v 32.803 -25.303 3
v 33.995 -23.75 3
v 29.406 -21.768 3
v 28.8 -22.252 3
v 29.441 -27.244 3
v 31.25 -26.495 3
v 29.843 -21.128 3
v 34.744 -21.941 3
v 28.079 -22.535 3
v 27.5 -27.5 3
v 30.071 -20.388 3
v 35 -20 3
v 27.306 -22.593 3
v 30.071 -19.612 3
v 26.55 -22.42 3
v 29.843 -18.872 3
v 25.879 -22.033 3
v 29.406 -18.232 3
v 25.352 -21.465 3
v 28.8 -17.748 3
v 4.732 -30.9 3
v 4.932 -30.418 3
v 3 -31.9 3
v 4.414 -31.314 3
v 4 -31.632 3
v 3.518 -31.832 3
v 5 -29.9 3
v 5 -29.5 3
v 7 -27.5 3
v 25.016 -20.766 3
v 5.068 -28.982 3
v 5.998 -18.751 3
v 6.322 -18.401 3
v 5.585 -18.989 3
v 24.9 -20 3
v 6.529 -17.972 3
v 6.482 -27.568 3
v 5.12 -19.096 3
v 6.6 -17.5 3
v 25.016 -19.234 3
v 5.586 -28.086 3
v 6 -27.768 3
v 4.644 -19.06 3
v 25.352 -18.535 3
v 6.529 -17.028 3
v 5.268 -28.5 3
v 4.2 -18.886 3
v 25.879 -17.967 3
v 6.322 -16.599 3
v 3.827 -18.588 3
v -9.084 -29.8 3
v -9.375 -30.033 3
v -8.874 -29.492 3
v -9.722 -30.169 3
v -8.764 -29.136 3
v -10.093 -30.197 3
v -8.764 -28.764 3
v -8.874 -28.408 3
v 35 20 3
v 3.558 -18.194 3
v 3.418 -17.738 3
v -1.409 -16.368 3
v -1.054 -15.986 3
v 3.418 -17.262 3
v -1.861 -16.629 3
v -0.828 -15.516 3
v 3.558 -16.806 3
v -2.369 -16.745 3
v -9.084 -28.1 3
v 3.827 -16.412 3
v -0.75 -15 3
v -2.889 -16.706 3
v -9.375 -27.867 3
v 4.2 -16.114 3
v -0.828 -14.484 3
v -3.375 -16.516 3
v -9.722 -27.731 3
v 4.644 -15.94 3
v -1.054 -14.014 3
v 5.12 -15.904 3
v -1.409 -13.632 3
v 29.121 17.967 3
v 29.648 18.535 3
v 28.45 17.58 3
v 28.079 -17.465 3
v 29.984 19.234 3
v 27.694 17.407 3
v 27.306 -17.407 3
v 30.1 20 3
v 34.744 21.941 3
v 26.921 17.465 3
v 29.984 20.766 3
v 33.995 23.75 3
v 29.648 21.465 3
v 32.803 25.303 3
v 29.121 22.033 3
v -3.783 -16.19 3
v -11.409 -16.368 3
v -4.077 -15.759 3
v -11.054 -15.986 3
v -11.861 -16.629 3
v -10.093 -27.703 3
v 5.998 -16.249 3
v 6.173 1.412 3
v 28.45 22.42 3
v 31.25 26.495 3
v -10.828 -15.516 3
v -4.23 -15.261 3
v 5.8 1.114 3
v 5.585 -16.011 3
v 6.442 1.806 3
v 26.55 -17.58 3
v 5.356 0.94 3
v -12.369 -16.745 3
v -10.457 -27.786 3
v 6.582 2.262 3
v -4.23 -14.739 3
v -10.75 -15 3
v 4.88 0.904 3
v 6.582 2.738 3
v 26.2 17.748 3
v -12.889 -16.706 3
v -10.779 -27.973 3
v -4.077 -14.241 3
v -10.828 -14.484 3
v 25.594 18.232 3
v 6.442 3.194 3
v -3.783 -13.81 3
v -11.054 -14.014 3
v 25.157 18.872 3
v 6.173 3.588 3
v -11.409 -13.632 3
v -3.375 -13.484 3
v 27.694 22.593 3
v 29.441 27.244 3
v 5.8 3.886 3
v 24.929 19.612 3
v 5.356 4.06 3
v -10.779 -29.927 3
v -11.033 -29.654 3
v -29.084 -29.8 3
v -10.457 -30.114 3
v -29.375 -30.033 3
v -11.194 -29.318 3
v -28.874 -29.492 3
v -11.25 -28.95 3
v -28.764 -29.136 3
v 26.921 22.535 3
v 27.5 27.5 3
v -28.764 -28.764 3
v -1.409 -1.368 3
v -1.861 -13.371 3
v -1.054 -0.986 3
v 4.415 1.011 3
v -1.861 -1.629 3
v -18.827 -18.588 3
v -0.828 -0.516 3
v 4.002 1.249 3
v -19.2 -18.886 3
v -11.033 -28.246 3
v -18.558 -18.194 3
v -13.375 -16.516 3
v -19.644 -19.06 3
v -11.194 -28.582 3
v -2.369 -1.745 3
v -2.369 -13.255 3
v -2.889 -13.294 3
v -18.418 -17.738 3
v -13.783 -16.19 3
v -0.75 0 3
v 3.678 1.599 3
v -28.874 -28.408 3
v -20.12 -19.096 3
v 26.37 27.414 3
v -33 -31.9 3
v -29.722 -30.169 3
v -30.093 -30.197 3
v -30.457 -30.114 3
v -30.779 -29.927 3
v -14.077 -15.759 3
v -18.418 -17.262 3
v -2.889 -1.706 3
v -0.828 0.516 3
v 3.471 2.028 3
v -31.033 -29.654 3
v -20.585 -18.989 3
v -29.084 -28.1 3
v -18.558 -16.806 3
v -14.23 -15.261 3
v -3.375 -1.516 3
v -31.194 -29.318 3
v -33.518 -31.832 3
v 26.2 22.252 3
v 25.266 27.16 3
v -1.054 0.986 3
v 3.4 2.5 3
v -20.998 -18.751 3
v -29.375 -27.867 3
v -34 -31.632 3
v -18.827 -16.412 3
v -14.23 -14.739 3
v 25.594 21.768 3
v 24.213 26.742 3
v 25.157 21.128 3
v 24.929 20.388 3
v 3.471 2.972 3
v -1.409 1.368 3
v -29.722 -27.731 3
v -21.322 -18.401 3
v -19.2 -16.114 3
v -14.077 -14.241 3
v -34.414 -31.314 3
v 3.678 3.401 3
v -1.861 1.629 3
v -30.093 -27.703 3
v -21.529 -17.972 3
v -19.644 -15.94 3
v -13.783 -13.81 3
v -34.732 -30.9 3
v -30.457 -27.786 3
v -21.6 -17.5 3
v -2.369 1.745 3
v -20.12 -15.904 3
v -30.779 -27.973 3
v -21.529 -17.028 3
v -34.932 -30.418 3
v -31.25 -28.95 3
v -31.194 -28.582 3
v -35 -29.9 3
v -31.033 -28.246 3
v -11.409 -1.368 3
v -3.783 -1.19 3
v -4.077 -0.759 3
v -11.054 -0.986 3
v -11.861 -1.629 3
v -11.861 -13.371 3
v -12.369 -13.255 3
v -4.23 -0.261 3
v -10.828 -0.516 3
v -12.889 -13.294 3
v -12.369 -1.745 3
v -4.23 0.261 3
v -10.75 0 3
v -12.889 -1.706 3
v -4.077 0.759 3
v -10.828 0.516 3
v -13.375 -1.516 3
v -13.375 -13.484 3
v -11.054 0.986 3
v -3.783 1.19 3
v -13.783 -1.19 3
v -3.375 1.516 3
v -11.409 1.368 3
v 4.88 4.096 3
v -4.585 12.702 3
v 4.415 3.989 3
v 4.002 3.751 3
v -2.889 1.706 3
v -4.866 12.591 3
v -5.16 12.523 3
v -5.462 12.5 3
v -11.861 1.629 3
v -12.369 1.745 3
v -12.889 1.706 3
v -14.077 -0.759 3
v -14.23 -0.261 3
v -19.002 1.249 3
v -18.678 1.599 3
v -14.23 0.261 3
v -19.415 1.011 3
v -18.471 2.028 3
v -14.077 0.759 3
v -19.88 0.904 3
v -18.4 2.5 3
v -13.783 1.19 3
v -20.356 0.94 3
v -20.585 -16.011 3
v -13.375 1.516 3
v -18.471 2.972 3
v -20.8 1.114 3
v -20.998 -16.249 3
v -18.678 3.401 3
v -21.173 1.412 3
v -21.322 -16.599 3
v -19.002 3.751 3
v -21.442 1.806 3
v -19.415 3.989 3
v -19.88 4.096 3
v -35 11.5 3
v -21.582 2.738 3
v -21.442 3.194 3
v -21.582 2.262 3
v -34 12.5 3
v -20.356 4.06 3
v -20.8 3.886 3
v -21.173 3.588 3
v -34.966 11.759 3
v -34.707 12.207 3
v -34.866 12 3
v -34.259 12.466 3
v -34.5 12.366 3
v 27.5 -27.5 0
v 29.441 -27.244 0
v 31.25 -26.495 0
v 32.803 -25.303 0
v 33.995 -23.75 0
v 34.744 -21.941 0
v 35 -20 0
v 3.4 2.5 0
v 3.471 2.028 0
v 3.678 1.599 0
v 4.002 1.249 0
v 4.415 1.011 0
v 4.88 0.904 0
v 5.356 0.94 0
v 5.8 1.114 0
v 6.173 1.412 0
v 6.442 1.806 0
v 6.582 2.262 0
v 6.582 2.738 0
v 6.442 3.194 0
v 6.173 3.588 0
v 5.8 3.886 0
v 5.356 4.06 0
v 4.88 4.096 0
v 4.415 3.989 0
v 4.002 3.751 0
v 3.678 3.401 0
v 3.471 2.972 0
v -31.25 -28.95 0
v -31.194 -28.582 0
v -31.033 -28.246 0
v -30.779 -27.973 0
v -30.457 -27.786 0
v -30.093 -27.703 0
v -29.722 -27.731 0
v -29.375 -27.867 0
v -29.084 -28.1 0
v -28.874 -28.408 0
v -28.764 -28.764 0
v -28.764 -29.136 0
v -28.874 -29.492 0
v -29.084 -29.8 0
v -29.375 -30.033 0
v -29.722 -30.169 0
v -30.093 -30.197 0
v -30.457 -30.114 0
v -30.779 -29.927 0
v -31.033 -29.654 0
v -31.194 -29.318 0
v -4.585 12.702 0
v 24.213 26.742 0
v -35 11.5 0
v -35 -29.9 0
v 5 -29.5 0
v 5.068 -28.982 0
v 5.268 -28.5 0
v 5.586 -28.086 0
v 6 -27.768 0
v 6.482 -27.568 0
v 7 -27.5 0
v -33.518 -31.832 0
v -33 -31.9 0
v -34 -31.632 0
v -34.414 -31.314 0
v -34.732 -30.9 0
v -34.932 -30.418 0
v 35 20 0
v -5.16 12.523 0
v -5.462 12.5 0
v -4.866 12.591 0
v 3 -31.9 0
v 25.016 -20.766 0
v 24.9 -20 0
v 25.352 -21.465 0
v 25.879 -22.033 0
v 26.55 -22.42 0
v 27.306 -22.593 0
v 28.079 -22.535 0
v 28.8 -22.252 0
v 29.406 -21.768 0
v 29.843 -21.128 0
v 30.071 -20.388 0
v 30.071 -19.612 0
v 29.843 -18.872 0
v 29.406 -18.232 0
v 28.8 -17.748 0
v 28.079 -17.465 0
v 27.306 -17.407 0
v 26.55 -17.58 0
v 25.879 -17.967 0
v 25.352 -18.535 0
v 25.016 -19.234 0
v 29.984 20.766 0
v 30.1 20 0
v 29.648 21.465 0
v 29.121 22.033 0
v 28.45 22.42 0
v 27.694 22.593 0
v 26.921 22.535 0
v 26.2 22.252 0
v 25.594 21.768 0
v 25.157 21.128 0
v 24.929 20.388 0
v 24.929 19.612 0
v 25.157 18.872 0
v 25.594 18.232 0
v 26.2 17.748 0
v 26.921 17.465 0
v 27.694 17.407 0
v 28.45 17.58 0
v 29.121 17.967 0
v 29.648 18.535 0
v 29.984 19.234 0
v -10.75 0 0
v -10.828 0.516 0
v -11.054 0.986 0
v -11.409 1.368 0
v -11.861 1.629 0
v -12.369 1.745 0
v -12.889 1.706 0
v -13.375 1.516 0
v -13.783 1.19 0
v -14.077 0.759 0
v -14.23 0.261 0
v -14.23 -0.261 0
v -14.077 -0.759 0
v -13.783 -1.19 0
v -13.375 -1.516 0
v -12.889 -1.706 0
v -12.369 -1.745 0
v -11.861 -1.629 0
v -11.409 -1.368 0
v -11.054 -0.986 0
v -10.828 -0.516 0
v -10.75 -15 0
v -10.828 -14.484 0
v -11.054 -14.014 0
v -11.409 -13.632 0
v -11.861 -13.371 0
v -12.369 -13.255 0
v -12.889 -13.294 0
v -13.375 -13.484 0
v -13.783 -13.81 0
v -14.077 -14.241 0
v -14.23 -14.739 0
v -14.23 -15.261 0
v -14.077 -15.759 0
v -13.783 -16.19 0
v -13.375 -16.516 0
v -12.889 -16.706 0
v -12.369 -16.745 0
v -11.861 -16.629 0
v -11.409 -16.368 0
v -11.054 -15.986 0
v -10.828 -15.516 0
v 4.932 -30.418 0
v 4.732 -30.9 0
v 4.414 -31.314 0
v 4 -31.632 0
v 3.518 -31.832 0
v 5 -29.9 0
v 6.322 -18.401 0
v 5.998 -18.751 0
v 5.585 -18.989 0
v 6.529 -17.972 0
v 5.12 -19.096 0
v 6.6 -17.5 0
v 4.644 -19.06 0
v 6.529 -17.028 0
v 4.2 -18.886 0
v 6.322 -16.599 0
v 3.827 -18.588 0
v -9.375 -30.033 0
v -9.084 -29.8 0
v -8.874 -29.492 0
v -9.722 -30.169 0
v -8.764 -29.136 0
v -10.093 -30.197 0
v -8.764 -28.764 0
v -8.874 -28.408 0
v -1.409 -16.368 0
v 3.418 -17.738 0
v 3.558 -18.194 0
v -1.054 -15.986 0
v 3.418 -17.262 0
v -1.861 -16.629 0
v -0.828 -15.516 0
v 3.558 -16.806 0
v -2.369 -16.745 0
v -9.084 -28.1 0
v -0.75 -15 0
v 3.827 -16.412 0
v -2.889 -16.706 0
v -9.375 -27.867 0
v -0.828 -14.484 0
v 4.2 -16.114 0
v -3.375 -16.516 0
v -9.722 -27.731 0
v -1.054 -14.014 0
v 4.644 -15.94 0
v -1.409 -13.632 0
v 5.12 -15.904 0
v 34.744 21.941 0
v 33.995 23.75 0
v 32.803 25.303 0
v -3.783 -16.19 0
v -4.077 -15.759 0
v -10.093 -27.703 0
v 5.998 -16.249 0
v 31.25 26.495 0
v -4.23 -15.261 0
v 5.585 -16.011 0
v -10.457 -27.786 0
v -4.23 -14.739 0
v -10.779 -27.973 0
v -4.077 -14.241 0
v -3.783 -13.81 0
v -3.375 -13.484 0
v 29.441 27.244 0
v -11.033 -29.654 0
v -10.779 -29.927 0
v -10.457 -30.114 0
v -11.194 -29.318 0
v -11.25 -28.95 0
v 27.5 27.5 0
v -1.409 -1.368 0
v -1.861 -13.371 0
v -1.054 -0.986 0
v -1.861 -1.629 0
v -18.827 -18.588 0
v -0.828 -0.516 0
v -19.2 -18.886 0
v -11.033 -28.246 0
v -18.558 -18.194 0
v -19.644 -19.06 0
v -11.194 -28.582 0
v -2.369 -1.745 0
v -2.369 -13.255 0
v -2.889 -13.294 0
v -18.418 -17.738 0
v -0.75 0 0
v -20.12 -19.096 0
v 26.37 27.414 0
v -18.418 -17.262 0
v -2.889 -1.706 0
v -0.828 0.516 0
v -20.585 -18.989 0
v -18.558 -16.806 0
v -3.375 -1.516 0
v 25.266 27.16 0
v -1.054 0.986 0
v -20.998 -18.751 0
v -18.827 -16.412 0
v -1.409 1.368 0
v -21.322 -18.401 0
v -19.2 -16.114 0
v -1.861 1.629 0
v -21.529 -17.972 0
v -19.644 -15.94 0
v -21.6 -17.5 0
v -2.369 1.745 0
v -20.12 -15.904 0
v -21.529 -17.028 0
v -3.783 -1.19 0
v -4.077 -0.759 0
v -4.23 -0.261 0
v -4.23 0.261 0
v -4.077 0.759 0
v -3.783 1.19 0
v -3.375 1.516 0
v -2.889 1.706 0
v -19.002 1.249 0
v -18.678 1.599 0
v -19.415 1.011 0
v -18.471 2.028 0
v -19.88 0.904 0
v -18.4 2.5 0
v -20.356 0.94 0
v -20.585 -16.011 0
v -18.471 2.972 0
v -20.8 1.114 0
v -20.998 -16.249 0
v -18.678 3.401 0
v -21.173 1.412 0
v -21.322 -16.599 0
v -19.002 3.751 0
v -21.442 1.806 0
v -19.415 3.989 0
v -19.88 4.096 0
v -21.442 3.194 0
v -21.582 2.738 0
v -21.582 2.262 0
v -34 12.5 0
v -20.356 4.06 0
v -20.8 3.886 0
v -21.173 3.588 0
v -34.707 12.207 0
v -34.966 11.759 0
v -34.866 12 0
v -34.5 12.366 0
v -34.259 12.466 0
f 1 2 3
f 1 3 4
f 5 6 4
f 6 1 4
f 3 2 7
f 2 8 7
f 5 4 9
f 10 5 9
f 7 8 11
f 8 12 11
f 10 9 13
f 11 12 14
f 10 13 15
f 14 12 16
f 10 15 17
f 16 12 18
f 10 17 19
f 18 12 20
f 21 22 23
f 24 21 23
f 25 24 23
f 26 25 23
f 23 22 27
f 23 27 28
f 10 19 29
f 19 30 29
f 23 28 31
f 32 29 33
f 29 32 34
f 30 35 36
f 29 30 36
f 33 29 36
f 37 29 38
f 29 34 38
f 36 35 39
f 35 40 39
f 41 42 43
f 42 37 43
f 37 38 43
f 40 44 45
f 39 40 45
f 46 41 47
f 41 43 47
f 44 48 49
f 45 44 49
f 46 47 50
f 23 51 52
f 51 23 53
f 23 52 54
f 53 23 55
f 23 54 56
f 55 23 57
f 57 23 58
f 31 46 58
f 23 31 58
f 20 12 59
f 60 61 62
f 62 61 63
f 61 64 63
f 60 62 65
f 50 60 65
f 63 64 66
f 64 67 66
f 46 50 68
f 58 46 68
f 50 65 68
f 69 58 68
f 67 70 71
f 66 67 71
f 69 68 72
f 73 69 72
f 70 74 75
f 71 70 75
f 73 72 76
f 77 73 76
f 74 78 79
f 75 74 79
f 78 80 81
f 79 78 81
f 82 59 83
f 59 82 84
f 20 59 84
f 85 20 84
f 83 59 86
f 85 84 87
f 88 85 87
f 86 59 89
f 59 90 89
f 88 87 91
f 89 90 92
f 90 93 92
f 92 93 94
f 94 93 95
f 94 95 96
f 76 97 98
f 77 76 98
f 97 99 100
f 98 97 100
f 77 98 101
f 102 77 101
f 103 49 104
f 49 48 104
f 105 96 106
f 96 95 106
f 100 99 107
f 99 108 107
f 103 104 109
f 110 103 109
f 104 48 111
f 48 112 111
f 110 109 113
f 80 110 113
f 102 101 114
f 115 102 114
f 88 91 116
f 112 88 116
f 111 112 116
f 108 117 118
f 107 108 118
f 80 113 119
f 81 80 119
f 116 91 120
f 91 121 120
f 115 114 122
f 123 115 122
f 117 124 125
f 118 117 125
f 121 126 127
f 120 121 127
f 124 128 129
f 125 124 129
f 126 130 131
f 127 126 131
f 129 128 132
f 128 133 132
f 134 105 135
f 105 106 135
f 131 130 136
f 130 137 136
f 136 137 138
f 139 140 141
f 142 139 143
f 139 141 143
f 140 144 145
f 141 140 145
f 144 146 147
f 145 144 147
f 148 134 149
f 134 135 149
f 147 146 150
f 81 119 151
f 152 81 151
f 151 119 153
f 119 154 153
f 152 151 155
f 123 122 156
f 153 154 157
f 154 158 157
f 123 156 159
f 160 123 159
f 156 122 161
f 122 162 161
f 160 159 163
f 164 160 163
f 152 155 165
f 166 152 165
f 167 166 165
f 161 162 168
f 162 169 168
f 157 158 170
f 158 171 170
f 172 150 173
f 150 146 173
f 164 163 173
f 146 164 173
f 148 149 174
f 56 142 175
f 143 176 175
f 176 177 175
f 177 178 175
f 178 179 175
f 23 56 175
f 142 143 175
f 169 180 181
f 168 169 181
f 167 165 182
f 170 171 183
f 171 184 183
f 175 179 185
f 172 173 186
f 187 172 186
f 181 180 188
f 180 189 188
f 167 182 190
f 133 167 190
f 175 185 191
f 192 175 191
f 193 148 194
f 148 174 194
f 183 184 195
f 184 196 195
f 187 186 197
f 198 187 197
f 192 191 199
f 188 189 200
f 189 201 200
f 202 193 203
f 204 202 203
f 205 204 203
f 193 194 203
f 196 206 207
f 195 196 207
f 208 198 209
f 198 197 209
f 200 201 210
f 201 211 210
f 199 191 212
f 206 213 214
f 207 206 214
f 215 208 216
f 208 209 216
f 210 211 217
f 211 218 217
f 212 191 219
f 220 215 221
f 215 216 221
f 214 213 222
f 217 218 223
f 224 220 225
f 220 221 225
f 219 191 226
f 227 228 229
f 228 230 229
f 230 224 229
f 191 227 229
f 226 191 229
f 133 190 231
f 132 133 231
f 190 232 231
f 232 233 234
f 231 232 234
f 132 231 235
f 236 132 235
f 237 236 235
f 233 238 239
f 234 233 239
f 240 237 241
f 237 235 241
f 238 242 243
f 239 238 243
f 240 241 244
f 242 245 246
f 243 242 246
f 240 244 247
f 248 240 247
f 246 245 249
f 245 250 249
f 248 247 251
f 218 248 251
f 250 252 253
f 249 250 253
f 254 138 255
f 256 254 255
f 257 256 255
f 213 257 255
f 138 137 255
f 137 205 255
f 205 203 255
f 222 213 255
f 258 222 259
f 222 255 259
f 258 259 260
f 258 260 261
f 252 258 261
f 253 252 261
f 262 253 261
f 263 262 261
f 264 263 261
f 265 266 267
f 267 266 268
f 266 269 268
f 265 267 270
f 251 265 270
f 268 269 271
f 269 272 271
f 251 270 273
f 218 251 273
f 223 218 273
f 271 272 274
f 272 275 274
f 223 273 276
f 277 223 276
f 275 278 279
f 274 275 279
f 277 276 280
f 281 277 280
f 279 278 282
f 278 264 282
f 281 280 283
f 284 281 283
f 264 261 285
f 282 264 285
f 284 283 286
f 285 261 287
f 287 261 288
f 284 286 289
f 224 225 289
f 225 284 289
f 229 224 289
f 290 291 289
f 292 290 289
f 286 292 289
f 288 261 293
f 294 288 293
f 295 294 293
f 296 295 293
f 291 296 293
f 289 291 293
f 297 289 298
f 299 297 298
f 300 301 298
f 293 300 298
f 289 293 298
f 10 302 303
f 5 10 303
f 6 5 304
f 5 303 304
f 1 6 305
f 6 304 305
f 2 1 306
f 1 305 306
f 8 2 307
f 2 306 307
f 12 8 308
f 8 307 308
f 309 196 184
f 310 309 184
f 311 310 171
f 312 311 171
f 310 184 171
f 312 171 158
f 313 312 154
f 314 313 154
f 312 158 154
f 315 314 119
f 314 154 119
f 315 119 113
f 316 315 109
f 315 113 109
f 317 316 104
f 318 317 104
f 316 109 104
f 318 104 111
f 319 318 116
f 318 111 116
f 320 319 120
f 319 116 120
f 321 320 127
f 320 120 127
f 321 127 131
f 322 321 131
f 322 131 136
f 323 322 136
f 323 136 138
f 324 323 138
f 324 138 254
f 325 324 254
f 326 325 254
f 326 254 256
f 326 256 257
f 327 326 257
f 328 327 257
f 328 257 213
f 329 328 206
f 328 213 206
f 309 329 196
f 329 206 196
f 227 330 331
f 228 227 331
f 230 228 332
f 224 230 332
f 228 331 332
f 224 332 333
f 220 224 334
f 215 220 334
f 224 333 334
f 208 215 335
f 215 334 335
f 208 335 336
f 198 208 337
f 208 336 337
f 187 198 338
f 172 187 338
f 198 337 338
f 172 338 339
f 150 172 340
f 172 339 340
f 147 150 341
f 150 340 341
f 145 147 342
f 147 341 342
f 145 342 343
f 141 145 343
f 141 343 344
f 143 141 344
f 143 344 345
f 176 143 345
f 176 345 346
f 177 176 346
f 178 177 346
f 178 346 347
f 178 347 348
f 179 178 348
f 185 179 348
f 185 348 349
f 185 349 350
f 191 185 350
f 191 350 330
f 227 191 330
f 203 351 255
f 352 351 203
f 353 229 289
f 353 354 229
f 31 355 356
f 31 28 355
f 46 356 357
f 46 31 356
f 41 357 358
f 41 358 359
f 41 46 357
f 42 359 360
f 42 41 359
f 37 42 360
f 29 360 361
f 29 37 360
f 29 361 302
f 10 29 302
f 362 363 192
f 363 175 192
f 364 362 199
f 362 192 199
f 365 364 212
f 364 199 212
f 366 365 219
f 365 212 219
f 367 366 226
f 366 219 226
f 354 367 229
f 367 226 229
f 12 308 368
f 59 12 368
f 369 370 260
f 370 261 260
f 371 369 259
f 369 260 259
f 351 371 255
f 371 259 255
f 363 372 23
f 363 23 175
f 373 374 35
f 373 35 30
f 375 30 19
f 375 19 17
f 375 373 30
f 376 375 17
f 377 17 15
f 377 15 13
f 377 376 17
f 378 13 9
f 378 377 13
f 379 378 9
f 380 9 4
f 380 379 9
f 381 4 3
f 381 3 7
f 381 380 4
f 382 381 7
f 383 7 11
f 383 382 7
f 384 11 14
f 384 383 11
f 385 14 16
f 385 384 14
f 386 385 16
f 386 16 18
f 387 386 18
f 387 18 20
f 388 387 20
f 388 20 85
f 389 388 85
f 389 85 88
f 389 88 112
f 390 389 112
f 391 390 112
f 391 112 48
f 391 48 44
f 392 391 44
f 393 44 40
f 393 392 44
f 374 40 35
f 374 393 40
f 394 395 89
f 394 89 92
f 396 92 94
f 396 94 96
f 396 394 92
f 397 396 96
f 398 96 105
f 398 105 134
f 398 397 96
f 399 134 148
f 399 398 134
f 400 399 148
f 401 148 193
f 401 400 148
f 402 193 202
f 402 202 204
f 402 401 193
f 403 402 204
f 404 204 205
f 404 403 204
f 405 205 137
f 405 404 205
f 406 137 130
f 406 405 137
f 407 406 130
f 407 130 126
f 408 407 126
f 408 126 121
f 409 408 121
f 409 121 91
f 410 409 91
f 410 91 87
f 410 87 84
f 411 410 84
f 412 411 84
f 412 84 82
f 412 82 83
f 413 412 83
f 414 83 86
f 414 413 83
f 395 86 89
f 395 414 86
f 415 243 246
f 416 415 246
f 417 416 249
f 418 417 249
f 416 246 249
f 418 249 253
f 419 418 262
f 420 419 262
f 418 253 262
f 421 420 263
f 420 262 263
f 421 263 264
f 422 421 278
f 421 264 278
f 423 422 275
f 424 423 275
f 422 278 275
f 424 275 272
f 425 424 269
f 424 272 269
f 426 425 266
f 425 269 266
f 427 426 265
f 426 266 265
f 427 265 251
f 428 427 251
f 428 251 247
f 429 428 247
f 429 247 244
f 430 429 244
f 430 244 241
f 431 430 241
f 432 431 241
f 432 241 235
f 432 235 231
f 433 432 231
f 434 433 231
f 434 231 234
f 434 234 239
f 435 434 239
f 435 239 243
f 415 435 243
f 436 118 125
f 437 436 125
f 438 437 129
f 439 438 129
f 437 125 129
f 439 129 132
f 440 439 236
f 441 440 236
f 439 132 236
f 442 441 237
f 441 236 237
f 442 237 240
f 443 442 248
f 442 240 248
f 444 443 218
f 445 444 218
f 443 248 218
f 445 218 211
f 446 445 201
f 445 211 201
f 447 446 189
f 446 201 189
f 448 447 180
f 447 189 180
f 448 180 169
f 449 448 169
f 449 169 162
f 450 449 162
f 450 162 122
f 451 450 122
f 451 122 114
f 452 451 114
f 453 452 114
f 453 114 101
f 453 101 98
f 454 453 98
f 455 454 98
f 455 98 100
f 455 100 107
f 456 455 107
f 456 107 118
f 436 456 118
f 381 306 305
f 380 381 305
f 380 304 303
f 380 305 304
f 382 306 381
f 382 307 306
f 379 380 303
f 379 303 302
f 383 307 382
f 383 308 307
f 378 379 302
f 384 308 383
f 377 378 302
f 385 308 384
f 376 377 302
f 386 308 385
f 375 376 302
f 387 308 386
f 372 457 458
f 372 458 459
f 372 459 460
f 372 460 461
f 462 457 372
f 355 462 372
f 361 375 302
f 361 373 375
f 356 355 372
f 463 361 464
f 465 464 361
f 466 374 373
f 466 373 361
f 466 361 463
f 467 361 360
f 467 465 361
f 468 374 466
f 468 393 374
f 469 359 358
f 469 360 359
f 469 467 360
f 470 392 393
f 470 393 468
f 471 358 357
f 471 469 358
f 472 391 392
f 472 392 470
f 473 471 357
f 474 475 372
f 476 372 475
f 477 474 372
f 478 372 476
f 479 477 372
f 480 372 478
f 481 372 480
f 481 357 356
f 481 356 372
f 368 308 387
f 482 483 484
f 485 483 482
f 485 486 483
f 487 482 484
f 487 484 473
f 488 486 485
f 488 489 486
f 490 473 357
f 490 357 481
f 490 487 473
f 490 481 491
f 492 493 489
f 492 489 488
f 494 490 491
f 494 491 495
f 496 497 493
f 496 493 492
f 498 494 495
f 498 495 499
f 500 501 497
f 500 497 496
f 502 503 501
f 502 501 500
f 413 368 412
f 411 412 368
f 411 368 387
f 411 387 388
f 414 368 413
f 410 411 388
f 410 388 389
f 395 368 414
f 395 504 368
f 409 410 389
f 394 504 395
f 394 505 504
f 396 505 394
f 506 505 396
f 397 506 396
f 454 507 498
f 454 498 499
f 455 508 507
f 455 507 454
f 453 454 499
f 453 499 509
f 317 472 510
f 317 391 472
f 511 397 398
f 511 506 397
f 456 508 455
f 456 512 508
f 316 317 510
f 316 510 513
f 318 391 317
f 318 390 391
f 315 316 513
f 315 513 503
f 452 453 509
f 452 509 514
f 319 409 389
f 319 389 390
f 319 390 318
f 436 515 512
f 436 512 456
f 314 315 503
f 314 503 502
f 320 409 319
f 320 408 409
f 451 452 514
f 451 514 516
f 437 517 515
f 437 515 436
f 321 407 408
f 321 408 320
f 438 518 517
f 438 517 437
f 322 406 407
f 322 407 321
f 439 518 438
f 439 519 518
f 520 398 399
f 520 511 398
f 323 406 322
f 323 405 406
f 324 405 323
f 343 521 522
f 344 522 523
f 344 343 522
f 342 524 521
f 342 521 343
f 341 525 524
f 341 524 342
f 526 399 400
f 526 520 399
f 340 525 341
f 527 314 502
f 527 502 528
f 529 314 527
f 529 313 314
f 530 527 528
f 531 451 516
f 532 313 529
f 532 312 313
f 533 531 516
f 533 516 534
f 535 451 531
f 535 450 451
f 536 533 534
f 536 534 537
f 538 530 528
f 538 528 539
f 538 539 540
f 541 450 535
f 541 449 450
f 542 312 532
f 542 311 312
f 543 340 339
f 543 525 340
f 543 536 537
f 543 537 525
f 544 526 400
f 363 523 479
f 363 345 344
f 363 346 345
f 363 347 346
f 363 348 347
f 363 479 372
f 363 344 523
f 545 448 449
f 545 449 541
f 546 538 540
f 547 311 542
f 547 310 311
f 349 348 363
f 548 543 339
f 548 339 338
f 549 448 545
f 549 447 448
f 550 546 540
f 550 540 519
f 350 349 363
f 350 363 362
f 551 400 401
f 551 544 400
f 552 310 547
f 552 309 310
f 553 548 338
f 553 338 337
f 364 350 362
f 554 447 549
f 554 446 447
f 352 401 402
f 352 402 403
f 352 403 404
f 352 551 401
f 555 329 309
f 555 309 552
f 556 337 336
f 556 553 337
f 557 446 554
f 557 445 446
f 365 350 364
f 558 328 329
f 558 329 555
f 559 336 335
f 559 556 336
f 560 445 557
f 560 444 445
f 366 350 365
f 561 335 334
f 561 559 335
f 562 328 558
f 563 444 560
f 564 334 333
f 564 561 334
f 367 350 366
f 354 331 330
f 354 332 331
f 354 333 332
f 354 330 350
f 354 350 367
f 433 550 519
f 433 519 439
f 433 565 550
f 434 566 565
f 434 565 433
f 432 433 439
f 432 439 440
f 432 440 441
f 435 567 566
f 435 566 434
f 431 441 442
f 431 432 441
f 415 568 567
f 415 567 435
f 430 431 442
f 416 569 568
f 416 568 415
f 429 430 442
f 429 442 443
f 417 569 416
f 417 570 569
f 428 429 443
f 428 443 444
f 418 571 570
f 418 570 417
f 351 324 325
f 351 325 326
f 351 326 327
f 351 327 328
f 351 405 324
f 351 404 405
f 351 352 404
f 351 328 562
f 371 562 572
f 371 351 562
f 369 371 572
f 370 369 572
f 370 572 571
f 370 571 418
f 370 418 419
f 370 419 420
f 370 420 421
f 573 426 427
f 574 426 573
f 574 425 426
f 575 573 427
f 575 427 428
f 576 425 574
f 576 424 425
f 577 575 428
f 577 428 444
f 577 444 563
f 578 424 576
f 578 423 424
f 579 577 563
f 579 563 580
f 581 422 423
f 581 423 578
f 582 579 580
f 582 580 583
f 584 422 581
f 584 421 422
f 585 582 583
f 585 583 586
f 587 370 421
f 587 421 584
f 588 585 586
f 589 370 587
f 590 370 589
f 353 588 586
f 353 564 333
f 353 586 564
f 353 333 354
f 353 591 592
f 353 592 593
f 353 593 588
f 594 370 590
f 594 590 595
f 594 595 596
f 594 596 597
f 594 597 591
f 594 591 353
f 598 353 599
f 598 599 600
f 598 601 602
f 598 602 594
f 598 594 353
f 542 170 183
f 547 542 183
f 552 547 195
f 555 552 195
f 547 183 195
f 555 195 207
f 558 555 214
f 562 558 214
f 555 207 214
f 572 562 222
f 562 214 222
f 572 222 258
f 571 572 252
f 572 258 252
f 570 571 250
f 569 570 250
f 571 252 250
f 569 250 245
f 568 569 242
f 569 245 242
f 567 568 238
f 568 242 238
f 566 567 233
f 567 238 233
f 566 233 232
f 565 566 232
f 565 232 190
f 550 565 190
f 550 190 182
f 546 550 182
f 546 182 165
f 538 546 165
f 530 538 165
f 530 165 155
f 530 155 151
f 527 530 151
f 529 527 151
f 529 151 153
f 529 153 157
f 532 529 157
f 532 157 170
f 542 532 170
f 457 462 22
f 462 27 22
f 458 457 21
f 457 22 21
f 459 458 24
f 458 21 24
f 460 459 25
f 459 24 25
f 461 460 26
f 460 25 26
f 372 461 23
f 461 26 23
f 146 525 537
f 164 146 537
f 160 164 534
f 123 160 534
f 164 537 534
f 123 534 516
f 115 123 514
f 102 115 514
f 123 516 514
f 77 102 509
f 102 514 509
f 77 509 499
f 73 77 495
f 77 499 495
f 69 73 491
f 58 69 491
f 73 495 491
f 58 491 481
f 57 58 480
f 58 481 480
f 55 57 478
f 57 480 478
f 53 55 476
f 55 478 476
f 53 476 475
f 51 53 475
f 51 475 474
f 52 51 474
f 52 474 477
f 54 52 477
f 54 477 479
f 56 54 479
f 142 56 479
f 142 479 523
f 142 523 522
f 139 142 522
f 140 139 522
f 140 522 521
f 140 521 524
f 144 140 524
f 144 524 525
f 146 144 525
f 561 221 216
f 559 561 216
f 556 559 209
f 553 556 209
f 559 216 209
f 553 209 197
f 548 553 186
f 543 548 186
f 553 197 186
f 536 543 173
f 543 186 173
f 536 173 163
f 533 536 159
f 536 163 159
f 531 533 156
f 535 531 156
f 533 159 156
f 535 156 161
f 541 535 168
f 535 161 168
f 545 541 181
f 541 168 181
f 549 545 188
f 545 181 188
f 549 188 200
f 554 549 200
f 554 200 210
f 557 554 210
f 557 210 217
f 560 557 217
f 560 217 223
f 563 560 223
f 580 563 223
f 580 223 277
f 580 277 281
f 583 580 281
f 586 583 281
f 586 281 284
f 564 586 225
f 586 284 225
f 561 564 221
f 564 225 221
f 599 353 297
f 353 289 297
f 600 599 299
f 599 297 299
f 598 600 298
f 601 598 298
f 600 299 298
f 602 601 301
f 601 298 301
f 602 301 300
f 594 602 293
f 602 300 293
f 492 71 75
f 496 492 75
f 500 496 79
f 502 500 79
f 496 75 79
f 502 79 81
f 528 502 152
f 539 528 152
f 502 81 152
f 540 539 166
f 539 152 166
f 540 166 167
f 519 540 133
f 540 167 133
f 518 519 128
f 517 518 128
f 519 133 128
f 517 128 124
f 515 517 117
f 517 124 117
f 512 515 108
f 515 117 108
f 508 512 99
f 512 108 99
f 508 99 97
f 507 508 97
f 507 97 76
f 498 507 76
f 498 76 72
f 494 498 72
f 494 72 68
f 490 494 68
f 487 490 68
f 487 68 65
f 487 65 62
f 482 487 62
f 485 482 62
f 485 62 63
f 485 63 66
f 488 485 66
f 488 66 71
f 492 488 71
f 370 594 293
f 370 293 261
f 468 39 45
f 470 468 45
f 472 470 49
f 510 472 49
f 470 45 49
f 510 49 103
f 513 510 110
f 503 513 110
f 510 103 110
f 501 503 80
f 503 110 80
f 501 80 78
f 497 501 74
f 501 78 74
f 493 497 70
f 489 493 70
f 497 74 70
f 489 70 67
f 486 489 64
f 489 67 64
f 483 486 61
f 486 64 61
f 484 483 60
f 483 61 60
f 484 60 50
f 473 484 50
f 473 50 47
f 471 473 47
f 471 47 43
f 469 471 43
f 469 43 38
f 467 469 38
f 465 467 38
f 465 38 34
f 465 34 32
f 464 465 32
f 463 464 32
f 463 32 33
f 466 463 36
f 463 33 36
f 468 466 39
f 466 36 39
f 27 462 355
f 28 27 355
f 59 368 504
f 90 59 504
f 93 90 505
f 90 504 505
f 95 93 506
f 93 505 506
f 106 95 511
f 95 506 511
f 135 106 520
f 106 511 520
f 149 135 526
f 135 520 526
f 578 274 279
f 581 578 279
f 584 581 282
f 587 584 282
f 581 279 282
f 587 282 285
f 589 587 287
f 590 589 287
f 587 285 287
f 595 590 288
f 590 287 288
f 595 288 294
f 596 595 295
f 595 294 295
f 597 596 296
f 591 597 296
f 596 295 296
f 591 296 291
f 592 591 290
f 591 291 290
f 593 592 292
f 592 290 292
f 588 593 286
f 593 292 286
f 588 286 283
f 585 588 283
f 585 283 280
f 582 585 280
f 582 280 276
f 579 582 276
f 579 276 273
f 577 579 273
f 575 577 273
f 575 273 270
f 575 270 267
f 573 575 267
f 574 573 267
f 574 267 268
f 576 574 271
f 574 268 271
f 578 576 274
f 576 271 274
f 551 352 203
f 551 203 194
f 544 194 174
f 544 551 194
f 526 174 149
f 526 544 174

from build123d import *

# Parameters (mm, degrees)
SKETCH_1_R          = 2.6
EXTRUDE_1_DEPTH     = 3
CUT_EXTRUDE_START   = -3
CUT_EXTRUDE_1_DEPTH = 3
SKETCH_3_R          = 1.6
CUT_EXTRUDE_2_DEPTH = 3
FILLET_1_R          = 1
SKETCH_4_R          = 1.75
CUT_EXTRUDE_3_DEPTH = 10
SKETCH_5_W          = 40
SKETCH_5_H          = 5.4
EXTRUDE_2_DEPTH     = 3
SKETCH_6_R          = 1.25
CUT_EXTRUDE_4_DEPTH = 4
FILLET_2_R          = 2


with BuildPart() as part:
    # 草图1 → 凸台-拉伸1 (new body)
    with BuildSketch(Plane.XY):
        with BuildLine():
            Line((-35, -27.5), (27.5, -27.5))
            ThreePointArc((27.5, -27.5), (32.803300859, -25.303300859), (35, -20))
            Line((35, -20), (35, 20))
            ThreePointArc((35, 20), (32.803300859, 25.303300859), (27.5, 27.5))
            Line((27.5, 27.5), (-35, 27.5))
            Line((-35, 27.5), (-35, -27.5))
        make_face()
        with Locations((27.5, 20)):
            Circle(SKETCH_1_R, mode=Mode.SUBTRACT)
        with Locations(Location((27.5, -20, 0), (0, 0, 180))):
            Circle(SKETCH_1_R, mode=Mode.SUBTRACT)
    extrude(amount=EXTRUDE_1_DEPTH)

    # 草图2 → 切除-拉伸1 (cut)
    with BuildSketch(Plane.XY.offset(3).offset(CUT_EXTRUDE_START)):
        with BuildLine():
            Line((-35, 12.5), (-5, 12.5))
            Line((-5, 12.5), (24.213483146, 26.741573034))
            ThreePointArc((24.213483146, 26.741573034), (25.8135537, 27.307933968), (27.5, 27.5))
            Line((27.5, 27.5), (27.5, 37.5))
            Line((27.5, 37.5), (-35, 37.5))
            Line((-35, 37.5), (-35, 12.5))
        make_face()
    extrude(amount=CUT_EXTRUDE_1_DEPTH, mode=Mode.SUBTRACT)

    # 草图3 → 切除-拉伸2 (cut)
    with BuildSketch(Plane.XY.offset(3)):
        with Locations((-20, 2.5)):
            Circle(SKETCH_3_R)
        with Locations(Location((5, 2.5, 0), (0, 0, 180))):
            Circle(SKETCH_3_R)
        with Locations((5, -17.5)):
            Circle(SKETCH_3_R)
        with Locations(Location((-20, -17.5, 0), (0, 0, 180))):
            Circle(SKETCH_3_R)
    extrude(amount=-CUT_EXTRUDE_2_DEPTH, mode=Mode.SUBTRACT)

    # 圆角1
    fillet_1_edges = [part.edges().sort_by_distance(p)[0] for p in [
        (-35, -27.5, 1.5),
        (-35, 12.5, 1.5),
    ]]
    fillet(fillet_1_edges, radius=FILLET_1_R)

    # 草图4 → 切除-拉伸3 (cut)
    with BuildSketch(Plane.XY.offset(3)):
        with Locations((-2.5, 0)):
            Circle(SKETCH_4_R)
        with Locations((-12.5, 0)):
            Circle(SKETCH_4_R)
        with Locations((-12.5, -15)):
            Circle(SKETCH_4_R)
        with Locations((-2.5, -15)):
            Circle(SKETCH_4_R)
    extrude(amount=-CUT_EXTRUDE_3_DEPTH, mode=Mode.SUBTRACT)

    # 草图5 → 凸台-拉伸2 (add)
    with BuildSketch(Plane(origin=(0, 0, 0), x_dir=(-1, 0, 0), z_dir=(0, 0, -1))):
        with Locations((15, -29.2)):
            Rectangle(SKETCH_5_W, SKETCH_5_H)
    extrude(amount=-EXTRUDE_2_DEPTH)

    # 草图6 → 切除-拉伸4 (cut)
    with BuildSketch(Plane(origin=(0, 0, 0), x_dir=(-1, 0, 0), z_dir=(0, 0, -1))):
        with Locations((30, -28.95)):
            Circle(SKETCH_6_R)
        with Locations((10, -28.95)):
            Circle(SKETCH_6_R)
    extrude(amount=-CUT_EXTRUDE_4_DEPTH, mode=Mode.SUBTRACT)

    # 圆角2
    fillet_2_edges = [part.edges().sort_by_distance(p)[0] for p in [
        (5, -27.5, 1.5),
        (5, -31.9, 1.5),
        (-35, -31.9, 1.5),
        (-5, 12.5, 1.5),
    ]]
    fillet(fillet_2_edges, radius=FILLET_2_R)


solid = part.part
